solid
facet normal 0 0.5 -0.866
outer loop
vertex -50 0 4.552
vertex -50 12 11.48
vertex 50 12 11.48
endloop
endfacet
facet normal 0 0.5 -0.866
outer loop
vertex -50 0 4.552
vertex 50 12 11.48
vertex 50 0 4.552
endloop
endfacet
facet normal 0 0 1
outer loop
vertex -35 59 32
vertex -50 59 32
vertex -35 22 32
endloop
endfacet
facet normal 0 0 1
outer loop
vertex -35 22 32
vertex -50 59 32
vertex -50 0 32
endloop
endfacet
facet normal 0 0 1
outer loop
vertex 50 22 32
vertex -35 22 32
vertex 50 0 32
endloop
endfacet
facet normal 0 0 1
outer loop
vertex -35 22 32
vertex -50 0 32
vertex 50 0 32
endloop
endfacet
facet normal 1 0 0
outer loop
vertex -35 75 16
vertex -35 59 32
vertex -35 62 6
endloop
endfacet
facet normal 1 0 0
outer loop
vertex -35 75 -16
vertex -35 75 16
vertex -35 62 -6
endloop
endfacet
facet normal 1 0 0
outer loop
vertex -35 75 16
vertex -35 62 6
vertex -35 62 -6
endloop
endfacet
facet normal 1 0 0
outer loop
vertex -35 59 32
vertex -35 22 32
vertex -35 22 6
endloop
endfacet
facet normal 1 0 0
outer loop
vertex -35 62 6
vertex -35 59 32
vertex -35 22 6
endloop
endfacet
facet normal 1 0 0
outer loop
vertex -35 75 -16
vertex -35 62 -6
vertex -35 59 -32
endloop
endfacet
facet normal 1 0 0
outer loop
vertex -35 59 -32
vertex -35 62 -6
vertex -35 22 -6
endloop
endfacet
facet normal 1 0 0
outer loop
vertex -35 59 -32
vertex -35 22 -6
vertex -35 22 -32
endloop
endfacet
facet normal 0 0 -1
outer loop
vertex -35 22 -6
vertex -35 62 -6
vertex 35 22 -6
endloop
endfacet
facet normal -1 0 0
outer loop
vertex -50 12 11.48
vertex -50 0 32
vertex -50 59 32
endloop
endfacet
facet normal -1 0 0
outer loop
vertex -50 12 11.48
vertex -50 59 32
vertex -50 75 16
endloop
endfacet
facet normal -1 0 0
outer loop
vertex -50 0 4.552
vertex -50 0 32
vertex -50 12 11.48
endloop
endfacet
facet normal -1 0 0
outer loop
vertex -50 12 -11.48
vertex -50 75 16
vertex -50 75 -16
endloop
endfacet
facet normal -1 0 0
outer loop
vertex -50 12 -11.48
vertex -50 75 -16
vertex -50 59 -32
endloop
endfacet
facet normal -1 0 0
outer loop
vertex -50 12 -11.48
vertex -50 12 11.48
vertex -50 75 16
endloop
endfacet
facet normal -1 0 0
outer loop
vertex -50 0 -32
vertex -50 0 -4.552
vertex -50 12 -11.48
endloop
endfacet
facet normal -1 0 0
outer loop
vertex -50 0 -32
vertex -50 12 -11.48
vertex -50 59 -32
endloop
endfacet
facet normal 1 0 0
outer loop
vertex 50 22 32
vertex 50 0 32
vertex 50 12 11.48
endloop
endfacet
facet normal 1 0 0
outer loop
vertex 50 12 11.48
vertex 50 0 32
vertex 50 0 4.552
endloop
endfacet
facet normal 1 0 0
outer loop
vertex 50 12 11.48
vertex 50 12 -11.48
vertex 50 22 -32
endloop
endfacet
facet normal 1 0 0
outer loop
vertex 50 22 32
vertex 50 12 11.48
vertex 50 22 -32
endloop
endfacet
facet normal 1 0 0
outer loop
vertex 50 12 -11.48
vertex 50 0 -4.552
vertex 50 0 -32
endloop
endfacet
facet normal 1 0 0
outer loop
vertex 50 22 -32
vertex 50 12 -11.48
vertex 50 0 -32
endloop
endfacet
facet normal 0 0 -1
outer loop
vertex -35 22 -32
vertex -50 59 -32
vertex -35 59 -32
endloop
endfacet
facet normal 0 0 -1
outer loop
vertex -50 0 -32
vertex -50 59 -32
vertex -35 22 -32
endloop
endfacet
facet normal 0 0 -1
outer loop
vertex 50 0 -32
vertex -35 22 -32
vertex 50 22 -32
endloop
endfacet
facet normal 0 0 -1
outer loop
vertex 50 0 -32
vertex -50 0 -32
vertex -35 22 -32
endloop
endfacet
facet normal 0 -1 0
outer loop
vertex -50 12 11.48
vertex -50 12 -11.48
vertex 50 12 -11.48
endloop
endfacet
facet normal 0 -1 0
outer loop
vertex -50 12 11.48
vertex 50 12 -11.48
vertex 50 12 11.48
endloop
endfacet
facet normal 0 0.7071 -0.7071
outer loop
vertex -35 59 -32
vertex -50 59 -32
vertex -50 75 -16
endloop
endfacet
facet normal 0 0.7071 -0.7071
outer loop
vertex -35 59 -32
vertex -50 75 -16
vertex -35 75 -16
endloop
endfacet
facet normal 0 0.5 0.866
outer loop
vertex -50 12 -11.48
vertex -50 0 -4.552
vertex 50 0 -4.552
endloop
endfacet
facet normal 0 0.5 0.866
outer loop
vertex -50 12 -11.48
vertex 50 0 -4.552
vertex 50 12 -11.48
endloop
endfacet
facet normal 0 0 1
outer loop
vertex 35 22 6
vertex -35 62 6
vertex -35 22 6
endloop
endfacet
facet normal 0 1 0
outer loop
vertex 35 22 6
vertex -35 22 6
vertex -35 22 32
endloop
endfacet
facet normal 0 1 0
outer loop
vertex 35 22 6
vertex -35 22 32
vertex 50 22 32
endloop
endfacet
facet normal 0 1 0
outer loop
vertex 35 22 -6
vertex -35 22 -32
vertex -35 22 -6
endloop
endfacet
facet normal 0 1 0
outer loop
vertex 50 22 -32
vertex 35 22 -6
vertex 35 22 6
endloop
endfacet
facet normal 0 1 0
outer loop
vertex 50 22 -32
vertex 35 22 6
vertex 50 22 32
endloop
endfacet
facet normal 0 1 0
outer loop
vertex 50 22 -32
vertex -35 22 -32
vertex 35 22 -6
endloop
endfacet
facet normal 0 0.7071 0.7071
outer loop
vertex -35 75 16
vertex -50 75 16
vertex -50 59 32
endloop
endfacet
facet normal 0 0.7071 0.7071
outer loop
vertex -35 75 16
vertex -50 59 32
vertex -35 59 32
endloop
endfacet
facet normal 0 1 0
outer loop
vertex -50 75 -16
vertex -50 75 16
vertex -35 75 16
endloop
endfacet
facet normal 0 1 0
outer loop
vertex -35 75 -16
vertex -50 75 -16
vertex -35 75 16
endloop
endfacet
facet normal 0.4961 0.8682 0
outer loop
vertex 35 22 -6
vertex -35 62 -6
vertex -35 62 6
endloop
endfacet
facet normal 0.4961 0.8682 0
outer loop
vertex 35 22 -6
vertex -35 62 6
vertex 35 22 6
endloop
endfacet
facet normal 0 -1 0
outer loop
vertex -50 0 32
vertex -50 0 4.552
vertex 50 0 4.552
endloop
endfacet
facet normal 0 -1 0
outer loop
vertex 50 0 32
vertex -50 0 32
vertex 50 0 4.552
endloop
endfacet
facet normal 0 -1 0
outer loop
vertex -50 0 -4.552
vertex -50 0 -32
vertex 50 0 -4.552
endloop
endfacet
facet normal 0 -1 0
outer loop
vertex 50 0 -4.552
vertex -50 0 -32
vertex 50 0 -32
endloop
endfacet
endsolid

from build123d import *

# Parameters (mm, degrees)
SKETCH1_W               = 100
SKETCH1_H               = 64
BOSS_EXTRUDE1_DEPTH     = 22
CUT_EXTRUDE1_DEPTH      = 108.275346655
CUT_EXTRUDE1_DEPTH_BACK = 108.275346655
SKETCH4_W               = 15
SKETCH4_H               = 64
BOSS_EXTRUDE2_DEPTH     = 53
CHAMFER1_SIZE           = 16
CHAMFER2_SIZE           = 16
RIB1_REACH              = 97.65
SKETCH5_WALL_W          = 273.923387726
SKETCH5_WALL_H          = 12


with BuildPart() as part:
    # Sketch1 → Boss-Extrude1 (new body)
    with BuildSketch(Plane(origin=(0, 0, 0), x_dir=(1, 0, 0), z_dir=(0, 1, 0))):
        Rectangle(SKETCH1_W, SKETCH1_H)
    extrude(amount=BOSS_EXTRUDE1_DEPTH)

    # Sketch2 → Cut-Extrude1 (cut, two sides: drawn at the far end of the back side and taken through both)
    with BuildSketch(Plane(origin=(50, 0, 0), x_dir=(0, 0, -1), z_dir=(1, 0, 0)).offset(-CUT_EXTRUDE1_DEPTH_BACK)):
        Polygon((-43.110063235, -82.552699055), (4.551759787, 0), (11.479963017, 12), (-11.479963017, 12), (-4.551759787, 0), (43.110063235, -82.552699055), (43.110063235, 108.094593032), (-43.110063235, 108.094593032), align=None)
    extrude(amount=CUT_EXTRUDE1_DEPTH + CUT_EXTRUDE1_DEPTH_BACK, mode=Mode.SUBTRACT)

    # Sketch4 → Boss-Extrude2 (add)
    with BuildSketch(Plane(origin=(0, 22, 0), x_dir=(1, 0, 0), z_dir=(0, 1, 0))):
        with Locations((-42.5, 0)):
            Rectangle(SKETCH4_W, SKETCH4_H)
    extrude(amount=BOSS_EXTRUDE2_DEPTH)

    # Chamfer1
    chamfer1_edges = [part.edges().sort_by_distance(p)[0] for p in [
        (-42.5, 75, 32),
    ]]
    chamfer(chamfer1_edges, length=CHAMFER1_SIZE)

    # Chamfer2
    chamfer2_edges = [part.edges().sort_by_distance(p)[0] for p in [
        (-42.5, 75, -32),
    ]]
    chamfer(chamfer2_edges, length=CHAMFER2_SIZE)

    # Sketch5 wall → Rib1 (add, up to next)
    with BuildSketch(Plane(origin=(0, 42, 0), x_dir=(0.868243142124, -0.496138938357, 0), z_dir=(0.496138938357, 0.868243142124, 0)), mode=Mode.PRIVATE) as rib1_sk1:
        Rectangle(SKETCH5_WALL_W, SKETCH5_WALL_H)
    rib1_tool1 = extrude(rib1_sk1.sketch, amount=-RIB1_REACH, mode=Mode.PRIVATE) - part.part
    add(rib1_tool1.solids().sort_by_distance((0, 42, 0))[0])


solid = part.part
